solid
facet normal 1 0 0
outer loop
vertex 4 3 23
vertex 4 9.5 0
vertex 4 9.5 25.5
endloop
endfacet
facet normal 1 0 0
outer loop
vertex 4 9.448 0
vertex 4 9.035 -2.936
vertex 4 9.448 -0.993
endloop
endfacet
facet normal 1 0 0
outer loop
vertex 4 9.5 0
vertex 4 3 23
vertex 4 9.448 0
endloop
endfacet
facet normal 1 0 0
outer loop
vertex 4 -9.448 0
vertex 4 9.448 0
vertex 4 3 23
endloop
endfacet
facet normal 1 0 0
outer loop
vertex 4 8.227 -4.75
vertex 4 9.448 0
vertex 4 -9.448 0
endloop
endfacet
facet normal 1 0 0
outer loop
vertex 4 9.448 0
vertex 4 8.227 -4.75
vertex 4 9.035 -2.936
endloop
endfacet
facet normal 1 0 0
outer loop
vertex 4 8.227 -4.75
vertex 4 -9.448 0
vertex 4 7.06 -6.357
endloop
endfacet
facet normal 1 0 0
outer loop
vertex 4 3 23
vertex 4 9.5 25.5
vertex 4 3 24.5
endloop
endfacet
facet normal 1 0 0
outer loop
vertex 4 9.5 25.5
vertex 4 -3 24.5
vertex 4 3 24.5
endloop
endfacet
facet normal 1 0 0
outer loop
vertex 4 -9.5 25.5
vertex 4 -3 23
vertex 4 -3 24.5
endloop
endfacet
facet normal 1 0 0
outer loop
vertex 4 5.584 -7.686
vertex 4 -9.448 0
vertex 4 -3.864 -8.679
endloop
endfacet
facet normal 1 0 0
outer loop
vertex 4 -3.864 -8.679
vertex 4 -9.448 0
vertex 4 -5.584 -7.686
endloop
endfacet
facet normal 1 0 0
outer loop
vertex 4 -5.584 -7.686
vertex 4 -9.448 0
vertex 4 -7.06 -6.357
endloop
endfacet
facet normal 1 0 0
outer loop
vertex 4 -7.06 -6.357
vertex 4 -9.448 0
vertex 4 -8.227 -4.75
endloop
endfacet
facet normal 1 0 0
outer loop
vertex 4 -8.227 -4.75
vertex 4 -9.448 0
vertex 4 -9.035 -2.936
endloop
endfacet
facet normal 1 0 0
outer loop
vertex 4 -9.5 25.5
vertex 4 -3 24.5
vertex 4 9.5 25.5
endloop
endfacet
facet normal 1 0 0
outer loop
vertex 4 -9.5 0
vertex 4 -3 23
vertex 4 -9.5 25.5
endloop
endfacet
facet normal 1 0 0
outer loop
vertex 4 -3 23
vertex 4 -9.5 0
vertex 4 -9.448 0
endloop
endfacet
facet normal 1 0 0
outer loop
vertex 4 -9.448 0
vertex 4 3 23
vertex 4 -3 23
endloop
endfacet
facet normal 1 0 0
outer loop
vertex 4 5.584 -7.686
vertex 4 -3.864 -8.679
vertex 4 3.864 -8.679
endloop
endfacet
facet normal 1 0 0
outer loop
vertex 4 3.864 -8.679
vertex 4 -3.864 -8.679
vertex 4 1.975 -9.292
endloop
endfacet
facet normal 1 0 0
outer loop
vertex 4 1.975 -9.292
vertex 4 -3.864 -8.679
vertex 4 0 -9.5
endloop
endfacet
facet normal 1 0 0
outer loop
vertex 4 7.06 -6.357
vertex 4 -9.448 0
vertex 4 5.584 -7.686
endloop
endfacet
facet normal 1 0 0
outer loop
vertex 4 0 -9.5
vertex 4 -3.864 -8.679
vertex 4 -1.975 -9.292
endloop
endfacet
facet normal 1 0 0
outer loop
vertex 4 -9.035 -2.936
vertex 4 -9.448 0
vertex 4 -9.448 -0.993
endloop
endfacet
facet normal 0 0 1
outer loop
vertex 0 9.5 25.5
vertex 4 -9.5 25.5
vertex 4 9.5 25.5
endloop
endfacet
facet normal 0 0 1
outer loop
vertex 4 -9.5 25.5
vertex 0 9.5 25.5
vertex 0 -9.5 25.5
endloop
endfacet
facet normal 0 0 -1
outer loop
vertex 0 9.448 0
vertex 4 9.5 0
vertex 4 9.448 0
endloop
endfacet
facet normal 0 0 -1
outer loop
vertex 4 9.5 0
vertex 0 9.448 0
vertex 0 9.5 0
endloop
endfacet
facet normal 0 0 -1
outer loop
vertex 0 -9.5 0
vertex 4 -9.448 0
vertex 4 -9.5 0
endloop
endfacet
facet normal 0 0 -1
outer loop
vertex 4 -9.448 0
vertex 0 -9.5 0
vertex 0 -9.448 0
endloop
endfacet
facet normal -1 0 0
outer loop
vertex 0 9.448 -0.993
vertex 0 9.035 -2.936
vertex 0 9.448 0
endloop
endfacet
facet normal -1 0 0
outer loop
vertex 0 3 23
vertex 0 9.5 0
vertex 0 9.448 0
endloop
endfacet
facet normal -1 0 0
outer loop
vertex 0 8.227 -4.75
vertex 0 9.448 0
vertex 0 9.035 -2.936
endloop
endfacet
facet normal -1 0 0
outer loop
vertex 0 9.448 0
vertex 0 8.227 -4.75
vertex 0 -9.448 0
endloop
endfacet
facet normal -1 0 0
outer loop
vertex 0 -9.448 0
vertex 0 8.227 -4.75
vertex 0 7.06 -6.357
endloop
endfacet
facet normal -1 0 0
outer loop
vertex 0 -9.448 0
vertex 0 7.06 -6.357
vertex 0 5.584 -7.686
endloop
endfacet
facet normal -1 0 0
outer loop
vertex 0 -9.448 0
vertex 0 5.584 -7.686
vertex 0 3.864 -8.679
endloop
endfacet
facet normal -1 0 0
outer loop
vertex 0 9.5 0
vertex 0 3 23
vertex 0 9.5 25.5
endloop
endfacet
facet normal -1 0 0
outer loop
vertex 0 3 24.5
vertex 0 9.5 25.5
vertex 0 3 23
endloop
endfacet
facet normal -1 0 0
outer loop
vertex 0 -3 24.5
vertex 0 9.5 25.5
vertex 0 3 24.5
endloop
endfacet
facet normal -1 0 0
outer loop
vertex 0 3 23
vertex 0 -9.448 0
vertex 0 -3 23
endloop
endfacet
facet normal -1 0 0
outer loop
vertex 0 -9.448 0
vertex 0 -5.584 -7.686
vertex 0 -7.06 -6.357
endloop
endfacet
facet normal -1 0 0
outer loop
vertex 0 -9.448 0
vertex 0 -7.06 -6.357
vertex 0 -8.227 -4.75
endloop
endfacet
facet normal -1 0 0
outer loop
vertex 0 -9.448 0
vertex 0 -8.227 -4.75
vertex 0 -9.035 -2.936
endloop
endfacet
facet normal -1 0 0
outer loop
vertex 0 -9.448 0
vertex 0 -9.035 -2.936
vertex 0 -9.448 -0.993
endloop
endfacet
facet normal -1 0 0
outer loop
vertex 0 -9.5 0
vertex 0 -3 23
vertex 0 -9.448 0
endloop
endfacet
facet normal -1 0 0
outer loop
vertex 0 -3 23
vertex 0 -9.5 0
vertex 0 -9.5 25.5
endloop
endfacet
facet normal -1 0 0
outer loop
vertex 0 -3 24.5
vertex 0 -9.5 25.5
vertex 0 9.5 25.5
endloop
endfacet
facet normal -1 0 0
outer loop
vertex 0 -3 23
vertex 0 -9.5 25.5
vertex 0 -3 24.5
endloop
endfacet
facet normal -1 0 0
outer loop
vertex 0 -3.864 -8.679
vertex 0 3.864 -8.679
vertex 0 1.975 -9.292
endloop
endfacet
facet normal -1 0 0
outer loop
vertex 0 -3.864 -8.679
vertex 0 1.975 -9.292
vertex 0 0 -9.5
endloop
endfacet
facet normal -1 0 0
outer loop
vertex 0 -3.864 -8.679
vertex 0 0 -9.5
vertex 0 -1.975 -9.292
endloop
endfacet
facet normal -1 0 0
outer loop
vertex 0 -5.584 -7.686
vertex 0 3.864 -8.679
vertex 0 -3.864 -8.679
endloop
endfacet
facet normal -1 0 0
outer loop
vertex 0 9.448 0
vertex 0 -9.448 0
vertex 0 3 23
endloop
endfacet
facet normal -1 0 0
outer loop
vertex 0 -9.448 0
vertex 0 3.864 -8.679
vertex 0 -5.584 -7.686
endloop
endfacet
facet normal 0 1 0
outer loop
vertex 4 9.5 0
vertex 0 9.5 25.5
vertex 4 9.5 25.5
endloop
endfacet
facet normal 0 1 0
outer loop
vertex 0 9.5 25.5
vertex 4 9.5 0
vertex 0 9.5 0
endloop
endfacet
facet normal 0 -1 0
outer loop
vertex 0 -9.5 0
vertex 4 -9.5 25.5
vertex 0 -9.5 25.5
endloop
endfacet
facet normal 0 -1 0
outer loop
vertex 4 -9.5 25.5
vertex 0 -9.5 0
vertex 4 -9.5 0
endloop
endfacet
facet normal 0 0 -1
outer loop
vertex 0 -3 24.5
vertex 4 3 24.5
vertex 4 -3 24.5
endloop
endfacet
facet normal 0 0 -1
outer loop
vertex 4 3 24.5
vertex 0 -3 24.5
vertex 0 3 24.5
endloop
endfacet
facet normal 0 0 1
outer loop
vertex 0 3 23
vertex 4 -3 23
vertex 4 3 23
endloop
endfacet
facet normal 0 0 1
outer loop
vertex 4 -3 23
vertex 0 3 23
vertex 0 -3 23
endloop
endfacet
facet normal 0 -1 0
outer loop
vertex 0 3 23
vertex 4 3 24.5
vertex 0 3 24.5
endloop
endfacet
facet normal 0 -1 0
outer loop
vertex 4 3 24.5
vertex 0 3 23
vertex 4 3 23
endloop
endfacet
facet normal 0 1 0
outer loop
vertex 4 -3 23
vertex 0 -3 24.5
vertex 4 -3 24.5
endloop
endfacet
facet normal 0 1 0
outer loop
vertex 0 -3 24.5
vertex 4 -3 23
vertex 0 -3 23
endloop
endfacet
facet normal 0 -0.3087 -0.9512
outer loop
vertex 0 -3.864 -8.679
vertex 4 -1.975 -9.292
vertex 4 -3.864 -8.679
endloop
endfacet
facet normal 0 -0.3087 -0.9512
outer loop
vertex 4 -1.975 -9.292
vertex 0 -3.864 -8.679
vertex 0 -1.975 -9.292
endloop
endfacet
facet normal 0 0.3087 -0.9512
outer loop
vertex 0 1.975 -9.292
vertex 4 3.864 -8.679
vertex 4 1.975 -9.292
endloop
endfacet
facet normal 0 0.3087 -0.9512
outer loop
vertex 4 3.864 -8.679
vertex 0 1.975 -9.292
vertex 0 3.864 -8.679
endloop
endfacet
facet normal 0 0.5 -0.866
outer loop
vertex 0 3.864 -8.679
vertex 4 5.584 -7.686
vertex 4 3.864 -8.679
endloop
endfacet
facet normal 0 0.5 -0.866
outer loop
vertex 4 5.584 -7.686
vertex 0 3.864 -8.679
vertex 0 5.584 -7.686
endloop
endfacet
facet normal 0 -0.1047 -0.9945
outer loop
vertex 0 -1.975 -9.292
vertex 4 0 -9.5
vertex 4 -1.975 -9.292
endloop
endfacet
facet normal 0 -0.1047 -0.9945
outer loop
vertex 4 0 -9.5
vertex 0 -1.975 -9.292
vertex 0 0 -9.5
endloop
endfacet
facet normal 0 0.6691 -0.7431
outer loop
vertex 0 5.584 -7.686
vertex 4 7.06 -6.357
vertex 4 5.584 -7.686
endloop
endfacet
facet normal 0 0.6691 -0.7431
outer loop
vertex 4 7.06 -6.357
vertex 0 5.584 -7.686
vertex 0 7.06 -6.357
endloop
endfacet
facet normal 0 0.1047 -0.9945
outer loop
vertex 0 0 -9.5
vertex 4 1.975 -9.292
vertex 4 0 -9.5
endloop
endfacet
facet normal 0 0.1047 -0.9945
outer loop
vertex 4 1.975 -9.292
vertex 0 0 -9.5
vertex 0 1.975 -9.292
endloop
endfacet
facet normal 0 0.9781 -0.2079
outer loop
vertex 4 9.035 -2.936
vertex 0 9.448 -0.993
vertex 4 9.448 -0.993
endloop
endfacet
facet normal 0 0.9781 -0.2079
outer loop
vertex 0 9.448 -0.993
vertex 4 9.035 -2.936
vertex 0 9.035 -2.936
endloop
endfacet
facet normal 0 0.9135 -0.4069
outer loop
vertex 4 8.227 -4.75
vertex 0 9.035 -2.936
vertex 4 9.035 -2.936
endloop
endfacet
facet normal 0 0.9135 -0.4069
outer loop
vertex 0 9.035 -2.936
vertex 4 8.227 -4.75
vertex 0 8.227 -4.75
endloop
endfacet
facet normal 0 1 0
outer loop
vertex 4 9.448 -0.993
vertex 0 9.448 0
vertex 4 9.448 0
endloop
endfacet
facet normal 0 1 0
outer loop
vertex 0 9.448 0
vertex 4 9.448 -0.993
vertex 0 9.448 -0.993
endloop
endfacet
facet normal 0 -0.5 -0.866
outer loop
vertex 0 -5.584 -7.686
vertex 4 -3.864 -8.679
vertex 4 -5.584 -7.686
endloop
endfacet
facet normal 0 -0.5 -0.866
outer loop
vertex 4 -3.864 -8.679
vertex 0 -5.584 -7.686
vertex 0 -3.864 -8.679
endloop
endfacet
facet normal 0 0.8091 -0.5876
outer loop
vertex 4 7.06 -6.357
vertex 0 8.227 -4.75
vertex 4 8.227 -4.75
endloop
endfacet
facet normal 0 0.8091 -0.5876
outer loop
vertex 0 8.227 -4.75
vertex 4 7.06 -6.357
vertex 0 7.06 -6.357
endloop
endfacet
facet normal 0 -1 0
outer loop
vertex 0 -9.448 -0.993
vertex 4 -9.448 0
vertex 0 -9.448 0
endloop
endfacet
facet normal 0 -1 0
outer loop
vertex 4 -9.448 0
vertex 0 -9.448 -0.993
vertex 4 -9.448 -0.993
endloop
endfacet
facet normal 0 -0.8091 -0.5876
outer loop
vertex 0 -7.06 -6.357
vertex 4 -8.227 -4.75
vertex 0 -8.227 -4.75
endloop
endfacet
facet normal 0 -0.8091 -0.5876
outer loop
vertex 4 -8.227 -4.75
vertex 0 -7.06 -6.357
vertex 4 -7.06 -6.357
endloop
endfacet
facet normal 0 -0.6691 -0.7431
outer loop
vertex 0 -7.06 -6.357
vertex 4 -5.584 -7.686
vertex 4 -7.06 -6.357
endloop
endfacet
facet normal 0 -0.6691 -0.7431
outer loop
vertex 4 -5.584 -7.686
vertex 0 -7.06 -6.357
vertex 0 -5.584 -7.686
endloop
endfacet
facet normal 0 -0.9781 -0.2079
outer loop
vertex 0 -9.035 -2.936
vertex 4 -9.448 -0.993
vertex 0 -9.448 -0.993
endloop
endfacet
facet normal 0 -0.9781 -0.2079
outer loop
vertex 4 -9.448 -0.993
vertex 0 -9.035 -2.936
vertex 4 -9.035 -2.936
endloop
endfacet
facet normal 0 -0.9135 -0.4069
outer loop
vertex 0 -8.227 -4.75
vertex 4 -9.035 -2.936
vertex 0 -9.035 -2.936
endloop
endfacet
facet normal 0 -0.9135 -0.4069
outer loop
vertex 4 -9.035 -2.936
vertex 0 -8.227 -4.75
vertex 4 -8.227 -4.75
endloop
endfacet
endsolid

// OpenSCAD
rotate([0,90,0]) cylinder(r=9.5,h=4);
difference(){
translate([0,-9.5,0]) cube([4,19,25.5]);
translate([0,-3,23]) cube([4,6,1.5]);
}
